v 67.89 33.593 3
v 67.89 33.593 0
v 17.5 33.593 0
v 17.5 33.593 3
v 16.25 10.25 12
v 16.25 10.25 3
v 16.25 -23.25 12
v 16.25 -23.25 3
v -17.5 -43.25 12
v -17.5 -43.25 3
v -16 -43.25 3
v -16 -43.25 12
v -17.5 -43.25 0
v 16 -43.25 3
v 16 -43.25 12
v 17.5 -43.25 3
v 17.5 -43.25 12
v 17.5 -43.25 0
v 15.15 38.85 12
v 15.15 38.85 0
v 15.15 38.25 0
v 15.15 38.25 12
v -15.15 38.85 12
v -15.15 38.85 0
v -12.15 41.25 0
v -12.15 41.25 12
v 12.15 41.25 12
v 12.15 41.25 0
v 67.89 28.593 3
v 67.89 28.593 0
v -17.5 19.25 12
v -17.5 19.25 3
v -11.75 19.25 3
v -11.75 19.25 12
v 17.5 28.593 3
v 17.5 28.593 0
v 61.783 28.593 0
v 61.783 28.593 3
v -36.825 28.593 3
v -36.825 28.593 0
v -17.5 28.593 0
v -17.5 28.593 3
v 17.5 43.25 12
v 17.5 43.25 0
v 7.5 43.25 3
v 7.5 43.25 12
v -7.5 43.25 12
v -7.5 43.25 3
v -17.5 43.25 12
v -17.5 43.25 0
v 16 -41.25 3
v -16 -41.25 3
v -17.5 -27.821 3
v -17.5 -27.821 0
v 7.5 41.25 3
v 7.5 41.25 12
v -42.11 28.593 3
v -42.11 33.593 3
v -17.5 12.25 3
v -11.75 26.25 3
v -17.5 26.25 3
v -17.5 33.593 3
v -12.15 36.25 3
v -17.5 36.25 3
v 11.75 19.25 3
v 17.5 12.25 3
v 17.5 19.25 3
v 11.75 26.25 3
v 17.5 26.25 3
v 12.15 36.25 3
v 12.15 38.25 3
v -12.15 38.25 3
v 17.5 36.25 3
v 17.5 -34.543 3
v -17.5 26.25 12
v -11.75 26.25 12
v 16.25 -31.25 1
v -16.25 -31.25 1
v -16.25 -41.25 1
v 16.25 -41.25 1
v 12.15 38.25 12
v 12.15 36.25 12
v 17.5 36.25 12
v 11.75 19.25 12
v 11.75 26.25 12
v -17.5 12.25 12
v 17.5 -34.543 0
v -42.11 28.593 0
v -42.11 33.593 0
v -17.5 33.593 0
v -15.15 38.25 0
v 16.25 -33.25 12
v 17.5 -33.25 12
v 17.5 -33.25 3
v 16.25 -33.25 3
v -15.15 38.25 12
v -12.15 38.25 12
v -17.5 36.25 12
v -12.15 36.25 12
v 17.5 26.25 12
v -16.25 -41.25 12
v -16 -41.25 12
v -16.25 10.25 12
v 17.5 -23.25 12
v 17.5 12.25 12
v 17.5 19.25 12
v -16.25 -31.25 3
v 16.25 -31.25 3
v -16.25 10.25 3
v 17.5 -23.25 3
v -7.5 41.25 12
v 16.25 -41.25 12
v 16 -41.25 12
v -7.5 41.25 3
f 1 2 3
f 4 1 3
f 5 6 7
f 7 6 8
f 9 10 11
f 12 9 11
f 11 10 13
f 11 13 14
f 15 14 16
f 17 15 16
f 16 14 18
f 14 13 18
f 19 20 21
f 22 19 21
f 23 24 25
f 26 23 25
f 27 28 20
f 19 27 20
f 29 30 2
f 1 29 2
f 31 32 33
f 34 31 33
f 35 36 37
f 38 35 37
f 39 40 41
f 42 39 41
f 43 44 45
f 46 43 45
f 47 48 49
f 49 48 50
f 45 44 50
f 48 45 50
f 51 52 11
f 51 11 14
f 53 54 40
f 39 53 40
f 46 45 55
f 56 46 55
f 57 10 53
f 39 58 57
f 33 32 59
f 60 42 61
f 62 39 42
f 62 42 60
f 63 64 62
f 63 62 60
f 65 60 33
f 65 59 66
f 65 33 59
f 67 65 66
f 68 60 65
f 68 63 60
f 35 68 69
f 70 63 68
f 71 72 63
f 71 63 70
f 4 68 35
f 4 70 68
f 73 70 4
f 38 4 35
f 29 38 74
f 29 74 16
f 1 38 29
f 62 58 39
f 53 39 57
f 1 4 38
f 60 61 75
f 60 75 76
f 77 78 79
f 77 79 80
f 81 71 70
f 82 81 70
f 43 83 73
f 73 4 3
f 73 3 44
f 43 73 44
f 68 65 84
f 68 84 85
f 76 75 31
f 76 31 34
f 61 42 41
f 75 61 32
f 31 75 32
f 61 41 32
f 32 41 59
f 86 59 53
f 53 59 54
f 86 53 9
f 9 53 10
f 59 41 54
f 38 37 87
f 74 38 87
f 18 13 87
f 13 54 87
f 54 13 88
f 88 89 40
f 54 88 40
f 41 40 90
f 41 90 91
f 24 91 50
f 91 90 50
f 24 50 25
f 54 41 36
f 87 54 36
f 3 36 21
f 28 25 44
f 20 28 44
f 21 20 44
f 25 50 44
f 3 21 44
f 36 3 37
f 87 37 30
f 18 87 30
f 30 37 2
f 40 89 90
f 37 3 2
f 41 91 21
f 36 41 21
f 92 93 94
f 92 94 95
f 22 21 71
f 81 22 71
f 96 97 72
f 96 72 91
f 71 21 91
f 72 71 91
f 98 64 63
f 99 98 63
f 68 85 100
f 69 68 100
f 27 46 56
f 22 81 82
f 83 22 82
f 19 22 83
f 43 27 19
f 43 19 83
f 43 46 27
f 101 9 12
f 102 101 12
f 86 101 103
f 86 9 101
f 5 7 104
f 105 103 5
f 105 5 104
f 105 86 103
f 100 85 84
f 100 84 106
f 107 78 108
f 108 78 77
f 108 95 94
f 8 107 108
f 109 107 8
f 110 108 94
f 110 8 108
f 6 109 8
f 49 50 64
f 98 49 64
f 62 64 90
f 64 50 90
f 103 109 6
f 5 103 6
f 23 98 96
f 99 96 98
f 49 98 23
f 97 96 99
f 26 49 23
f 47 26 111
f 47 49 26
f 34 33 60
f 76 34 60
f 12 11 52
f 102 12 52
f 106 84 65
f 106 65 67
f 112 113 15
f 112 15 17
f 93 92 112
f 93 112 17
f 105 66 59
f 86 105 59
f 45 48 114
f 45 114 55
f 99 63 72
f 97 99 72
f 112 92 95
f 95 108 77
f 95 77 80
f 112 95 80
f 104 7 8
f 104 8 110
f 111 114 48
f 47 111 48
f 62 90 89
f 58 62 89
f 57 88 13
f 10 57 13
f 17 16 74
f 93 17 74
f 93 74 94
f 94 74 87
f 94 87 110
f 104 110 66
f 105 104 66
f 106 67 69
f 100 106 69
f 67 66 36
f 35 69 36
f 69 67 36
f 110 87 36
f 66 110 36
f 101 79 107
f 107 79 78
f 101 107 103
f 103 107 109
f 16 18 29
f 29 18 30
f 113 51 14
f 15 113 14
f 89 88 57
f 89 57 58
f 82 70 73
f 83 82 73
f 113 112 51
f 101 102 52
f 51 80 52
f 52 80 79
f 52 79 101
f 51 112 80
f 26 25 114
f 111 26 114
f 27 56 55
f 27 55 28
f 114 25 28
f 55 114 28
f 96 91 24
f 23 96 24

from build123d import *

# Parameters (mm, degrees)
F0_W     = 5
F0_H     = 5
F0_W_2   = 5.75
F0_H_2   = 7
F1_DEPTH = 3
F2_DEPTH = 1
F3_DEPTH = 12


# Not quite as in the source:
# - a feature names something its author has since deleted; it is built from what else it names


with BuildPart() as f1:
    # F0 (on Top) → F1 (new body)
    with BuildSketch(Plane.XY):
        Polygon((-7.5, 41.25), (-7.5, 43.25), (-17.5, 43.25), (-17.5, 36.25), (-12.15, 36.25), (-12.15, 38.25), (-15.15, 38.25), (-15.15, 38.85), (-12.15, 41.25), align=None)
        Polygon((7.5, 43.25), (0, 43.25), (-7.5, 43.25), (-7.5, 41.25), (0, 41.25), (7.5, 41.25), align=None)
        Polygon((17.5, 43.25), (7.5, 43.25), (7.5, 41.25), (12.15, 41.25), (15.15, 38.85), (15.15, 38.25), (12.15, 38.25), (12.15, 36.25), (17.5, 36.25), align=None)
        Polygon((-17.5, 0), (-17.5, -27.8208897438), (-17.5, -43.25), (-16, -43.25), (-16, -41.25), (-16.25, -41.25), (-16.25, -31.25), (-16.25, 10.25), (0, 10.25), (16.25, 10.25), (16.25, -23.25), (17.5, -23.25), (17.5, 0), (17.5, 12.25), (-17.5, 12.25), align=None)
        Polygon((16.25, -33.25), (17.5, -33.25), (17.5, -23.25), (16.25, -23.25), (16.25, -31.25), align=None)
        Polygon((62.8901566565, 28.5934534669), (61.7828955537, 28.5934534669), (17.5, -34.5426103437), (17.5, -43.25), (67.8901566565, 28.5934534669), align=None)
        Polygon((-17.5, 28.5934534669), (-17.5, 33.5934534669), (-37.1098433435, 33.5934534669), (-37.1098433435, 28.5934534669), (-36.8246298966, 28.5934534669), align=None)
        with Locations((-39.6098433435, 31.0934534669)):
            Rectangle(F0_W, F0_H)
        with Locations((65.3901566565, 31.0934534669)):
            Rectangle(F0_W, F0_H)
        Polygon((62.8901566565, 33.5934534669), (17.5, 33.5934534669), (17.5, 28.5934534669), (61.7828955537, 28.5934534669), (62.8901566565, 28.5934534669), align=None)
        Polygon((16.25, -31.25), (16.25, -23.25), (16.25, 10.25), (0, 10.25), (-16.25, 10.25), (-16.25, -31.25), align=None)
        Polygon((-17.5, -27.8208897438), (-36.8246298966, 28.5934534669), (-37.1098433435, 28.5934534669), (-42.1098433435, 28.5934534669), (-17.5, -43.25), align=None)
        Polygon((-16, -41.25), (-16, -43.25), (0, -43.25), (16, -43.25), (16, -41.25), (0, -41.25), align=None)
        Polygon((17.5, -43.25), (17.5, -34.5426103437), (17.5, -33.25), (16.25, -33.25), (16.25, -41.25), (16, -41.25), (16, -43.25), align=None)
        Polygon((-12.15, 36.25), (-17.5, 36.25), (-17.5, 33.5934534669), (-17.5, 28.5934534669), (-17.5, 26.25), (-11.75, 26.25), (-11.75, 19.25), (-17.5, 19.25), (-17.5, 12.25), (17.5, 12.25), (17.5, 19.25), (11.75, 19.25), (11.75, 26.25), (17.5, 26.25), (17.5, 28.5934534669), (17.5, 33.5934534669), (17.5, 36.25), (12.15, 36.25), (12.15, 38.25), (0, 38.25), (-12.15, 38.25), align=None)
        with Locations((-14.625, 22.75)):
            Rectangle(F0_W_2, F0_H_2)
        with Locations((14.625, 22.75)):
            Rectangle(F0_W_2, F0_H_2)
    extrude(amount=F1_DEPTH)

    # F0 (on Top) → F2 (join)
    with BuildSketch(Plane.XY):
        Polygon((16.25, -41.25), (16.25, -33.25), (16.25, -31.25), (-16.25, -31.25), (-16.25, -41.25), (-16, -41.25), (0, -41.25), (16, -41.25), align=None)
    extrude(amount=F2_DEPTH)

    # F0 (on Top) → F3 (join)
    with BuildSketch(Plane.XY):
        Polygon((-7.5, 41.25), (-7.5, 43.25), (-17.5, 43.25), (-17.5, 36.25), (-12.15, 36.25), (-12.15, 38.25), (-15.15, 38.25), (-15.15, 38.85), (-12.15, 41.25), align=None)
        Polygon((17.5, 43.25), (7.5, 43.25), (7.5, 41.25), (12.15, 41.25), (15.15, 38.85), (15.15, 38.25), (12.15, 38.25), (12.15, 36.25), (17.5, 36.25), align=None)
        Polygon((-17.5, 0), (-17.5, -27.8208897438), (-17.5, -43.25), (-16, -43.25), (-16, -41.25), (-16.25, -41.25), (-16.25, -31.25), (-16.25, 10.25), (0, 10.25), (16.25, 10.25), (16.25, -23.25), (17.5, -23.25), (17.5, 0), (17.5, 12.25), (-17.5, 12.25), align=None)
        Polygon((17.5, -43.25), (17.5, -34.5426103437), (17.5, -33.25), (16.25, -33.25), (16.25, -41.25), (16, -41.25), (16, -43.25), align=None)
        with Locations((-14.625, 22.75)):
            Rectangle(F0_W_2, F0_H_2)
        with Locations((14.625, 22.75)):
            Rectangle(F0_W_2, F0_H_2)
    extrude(amount=F3_DEPTH)


solid = f1.part
